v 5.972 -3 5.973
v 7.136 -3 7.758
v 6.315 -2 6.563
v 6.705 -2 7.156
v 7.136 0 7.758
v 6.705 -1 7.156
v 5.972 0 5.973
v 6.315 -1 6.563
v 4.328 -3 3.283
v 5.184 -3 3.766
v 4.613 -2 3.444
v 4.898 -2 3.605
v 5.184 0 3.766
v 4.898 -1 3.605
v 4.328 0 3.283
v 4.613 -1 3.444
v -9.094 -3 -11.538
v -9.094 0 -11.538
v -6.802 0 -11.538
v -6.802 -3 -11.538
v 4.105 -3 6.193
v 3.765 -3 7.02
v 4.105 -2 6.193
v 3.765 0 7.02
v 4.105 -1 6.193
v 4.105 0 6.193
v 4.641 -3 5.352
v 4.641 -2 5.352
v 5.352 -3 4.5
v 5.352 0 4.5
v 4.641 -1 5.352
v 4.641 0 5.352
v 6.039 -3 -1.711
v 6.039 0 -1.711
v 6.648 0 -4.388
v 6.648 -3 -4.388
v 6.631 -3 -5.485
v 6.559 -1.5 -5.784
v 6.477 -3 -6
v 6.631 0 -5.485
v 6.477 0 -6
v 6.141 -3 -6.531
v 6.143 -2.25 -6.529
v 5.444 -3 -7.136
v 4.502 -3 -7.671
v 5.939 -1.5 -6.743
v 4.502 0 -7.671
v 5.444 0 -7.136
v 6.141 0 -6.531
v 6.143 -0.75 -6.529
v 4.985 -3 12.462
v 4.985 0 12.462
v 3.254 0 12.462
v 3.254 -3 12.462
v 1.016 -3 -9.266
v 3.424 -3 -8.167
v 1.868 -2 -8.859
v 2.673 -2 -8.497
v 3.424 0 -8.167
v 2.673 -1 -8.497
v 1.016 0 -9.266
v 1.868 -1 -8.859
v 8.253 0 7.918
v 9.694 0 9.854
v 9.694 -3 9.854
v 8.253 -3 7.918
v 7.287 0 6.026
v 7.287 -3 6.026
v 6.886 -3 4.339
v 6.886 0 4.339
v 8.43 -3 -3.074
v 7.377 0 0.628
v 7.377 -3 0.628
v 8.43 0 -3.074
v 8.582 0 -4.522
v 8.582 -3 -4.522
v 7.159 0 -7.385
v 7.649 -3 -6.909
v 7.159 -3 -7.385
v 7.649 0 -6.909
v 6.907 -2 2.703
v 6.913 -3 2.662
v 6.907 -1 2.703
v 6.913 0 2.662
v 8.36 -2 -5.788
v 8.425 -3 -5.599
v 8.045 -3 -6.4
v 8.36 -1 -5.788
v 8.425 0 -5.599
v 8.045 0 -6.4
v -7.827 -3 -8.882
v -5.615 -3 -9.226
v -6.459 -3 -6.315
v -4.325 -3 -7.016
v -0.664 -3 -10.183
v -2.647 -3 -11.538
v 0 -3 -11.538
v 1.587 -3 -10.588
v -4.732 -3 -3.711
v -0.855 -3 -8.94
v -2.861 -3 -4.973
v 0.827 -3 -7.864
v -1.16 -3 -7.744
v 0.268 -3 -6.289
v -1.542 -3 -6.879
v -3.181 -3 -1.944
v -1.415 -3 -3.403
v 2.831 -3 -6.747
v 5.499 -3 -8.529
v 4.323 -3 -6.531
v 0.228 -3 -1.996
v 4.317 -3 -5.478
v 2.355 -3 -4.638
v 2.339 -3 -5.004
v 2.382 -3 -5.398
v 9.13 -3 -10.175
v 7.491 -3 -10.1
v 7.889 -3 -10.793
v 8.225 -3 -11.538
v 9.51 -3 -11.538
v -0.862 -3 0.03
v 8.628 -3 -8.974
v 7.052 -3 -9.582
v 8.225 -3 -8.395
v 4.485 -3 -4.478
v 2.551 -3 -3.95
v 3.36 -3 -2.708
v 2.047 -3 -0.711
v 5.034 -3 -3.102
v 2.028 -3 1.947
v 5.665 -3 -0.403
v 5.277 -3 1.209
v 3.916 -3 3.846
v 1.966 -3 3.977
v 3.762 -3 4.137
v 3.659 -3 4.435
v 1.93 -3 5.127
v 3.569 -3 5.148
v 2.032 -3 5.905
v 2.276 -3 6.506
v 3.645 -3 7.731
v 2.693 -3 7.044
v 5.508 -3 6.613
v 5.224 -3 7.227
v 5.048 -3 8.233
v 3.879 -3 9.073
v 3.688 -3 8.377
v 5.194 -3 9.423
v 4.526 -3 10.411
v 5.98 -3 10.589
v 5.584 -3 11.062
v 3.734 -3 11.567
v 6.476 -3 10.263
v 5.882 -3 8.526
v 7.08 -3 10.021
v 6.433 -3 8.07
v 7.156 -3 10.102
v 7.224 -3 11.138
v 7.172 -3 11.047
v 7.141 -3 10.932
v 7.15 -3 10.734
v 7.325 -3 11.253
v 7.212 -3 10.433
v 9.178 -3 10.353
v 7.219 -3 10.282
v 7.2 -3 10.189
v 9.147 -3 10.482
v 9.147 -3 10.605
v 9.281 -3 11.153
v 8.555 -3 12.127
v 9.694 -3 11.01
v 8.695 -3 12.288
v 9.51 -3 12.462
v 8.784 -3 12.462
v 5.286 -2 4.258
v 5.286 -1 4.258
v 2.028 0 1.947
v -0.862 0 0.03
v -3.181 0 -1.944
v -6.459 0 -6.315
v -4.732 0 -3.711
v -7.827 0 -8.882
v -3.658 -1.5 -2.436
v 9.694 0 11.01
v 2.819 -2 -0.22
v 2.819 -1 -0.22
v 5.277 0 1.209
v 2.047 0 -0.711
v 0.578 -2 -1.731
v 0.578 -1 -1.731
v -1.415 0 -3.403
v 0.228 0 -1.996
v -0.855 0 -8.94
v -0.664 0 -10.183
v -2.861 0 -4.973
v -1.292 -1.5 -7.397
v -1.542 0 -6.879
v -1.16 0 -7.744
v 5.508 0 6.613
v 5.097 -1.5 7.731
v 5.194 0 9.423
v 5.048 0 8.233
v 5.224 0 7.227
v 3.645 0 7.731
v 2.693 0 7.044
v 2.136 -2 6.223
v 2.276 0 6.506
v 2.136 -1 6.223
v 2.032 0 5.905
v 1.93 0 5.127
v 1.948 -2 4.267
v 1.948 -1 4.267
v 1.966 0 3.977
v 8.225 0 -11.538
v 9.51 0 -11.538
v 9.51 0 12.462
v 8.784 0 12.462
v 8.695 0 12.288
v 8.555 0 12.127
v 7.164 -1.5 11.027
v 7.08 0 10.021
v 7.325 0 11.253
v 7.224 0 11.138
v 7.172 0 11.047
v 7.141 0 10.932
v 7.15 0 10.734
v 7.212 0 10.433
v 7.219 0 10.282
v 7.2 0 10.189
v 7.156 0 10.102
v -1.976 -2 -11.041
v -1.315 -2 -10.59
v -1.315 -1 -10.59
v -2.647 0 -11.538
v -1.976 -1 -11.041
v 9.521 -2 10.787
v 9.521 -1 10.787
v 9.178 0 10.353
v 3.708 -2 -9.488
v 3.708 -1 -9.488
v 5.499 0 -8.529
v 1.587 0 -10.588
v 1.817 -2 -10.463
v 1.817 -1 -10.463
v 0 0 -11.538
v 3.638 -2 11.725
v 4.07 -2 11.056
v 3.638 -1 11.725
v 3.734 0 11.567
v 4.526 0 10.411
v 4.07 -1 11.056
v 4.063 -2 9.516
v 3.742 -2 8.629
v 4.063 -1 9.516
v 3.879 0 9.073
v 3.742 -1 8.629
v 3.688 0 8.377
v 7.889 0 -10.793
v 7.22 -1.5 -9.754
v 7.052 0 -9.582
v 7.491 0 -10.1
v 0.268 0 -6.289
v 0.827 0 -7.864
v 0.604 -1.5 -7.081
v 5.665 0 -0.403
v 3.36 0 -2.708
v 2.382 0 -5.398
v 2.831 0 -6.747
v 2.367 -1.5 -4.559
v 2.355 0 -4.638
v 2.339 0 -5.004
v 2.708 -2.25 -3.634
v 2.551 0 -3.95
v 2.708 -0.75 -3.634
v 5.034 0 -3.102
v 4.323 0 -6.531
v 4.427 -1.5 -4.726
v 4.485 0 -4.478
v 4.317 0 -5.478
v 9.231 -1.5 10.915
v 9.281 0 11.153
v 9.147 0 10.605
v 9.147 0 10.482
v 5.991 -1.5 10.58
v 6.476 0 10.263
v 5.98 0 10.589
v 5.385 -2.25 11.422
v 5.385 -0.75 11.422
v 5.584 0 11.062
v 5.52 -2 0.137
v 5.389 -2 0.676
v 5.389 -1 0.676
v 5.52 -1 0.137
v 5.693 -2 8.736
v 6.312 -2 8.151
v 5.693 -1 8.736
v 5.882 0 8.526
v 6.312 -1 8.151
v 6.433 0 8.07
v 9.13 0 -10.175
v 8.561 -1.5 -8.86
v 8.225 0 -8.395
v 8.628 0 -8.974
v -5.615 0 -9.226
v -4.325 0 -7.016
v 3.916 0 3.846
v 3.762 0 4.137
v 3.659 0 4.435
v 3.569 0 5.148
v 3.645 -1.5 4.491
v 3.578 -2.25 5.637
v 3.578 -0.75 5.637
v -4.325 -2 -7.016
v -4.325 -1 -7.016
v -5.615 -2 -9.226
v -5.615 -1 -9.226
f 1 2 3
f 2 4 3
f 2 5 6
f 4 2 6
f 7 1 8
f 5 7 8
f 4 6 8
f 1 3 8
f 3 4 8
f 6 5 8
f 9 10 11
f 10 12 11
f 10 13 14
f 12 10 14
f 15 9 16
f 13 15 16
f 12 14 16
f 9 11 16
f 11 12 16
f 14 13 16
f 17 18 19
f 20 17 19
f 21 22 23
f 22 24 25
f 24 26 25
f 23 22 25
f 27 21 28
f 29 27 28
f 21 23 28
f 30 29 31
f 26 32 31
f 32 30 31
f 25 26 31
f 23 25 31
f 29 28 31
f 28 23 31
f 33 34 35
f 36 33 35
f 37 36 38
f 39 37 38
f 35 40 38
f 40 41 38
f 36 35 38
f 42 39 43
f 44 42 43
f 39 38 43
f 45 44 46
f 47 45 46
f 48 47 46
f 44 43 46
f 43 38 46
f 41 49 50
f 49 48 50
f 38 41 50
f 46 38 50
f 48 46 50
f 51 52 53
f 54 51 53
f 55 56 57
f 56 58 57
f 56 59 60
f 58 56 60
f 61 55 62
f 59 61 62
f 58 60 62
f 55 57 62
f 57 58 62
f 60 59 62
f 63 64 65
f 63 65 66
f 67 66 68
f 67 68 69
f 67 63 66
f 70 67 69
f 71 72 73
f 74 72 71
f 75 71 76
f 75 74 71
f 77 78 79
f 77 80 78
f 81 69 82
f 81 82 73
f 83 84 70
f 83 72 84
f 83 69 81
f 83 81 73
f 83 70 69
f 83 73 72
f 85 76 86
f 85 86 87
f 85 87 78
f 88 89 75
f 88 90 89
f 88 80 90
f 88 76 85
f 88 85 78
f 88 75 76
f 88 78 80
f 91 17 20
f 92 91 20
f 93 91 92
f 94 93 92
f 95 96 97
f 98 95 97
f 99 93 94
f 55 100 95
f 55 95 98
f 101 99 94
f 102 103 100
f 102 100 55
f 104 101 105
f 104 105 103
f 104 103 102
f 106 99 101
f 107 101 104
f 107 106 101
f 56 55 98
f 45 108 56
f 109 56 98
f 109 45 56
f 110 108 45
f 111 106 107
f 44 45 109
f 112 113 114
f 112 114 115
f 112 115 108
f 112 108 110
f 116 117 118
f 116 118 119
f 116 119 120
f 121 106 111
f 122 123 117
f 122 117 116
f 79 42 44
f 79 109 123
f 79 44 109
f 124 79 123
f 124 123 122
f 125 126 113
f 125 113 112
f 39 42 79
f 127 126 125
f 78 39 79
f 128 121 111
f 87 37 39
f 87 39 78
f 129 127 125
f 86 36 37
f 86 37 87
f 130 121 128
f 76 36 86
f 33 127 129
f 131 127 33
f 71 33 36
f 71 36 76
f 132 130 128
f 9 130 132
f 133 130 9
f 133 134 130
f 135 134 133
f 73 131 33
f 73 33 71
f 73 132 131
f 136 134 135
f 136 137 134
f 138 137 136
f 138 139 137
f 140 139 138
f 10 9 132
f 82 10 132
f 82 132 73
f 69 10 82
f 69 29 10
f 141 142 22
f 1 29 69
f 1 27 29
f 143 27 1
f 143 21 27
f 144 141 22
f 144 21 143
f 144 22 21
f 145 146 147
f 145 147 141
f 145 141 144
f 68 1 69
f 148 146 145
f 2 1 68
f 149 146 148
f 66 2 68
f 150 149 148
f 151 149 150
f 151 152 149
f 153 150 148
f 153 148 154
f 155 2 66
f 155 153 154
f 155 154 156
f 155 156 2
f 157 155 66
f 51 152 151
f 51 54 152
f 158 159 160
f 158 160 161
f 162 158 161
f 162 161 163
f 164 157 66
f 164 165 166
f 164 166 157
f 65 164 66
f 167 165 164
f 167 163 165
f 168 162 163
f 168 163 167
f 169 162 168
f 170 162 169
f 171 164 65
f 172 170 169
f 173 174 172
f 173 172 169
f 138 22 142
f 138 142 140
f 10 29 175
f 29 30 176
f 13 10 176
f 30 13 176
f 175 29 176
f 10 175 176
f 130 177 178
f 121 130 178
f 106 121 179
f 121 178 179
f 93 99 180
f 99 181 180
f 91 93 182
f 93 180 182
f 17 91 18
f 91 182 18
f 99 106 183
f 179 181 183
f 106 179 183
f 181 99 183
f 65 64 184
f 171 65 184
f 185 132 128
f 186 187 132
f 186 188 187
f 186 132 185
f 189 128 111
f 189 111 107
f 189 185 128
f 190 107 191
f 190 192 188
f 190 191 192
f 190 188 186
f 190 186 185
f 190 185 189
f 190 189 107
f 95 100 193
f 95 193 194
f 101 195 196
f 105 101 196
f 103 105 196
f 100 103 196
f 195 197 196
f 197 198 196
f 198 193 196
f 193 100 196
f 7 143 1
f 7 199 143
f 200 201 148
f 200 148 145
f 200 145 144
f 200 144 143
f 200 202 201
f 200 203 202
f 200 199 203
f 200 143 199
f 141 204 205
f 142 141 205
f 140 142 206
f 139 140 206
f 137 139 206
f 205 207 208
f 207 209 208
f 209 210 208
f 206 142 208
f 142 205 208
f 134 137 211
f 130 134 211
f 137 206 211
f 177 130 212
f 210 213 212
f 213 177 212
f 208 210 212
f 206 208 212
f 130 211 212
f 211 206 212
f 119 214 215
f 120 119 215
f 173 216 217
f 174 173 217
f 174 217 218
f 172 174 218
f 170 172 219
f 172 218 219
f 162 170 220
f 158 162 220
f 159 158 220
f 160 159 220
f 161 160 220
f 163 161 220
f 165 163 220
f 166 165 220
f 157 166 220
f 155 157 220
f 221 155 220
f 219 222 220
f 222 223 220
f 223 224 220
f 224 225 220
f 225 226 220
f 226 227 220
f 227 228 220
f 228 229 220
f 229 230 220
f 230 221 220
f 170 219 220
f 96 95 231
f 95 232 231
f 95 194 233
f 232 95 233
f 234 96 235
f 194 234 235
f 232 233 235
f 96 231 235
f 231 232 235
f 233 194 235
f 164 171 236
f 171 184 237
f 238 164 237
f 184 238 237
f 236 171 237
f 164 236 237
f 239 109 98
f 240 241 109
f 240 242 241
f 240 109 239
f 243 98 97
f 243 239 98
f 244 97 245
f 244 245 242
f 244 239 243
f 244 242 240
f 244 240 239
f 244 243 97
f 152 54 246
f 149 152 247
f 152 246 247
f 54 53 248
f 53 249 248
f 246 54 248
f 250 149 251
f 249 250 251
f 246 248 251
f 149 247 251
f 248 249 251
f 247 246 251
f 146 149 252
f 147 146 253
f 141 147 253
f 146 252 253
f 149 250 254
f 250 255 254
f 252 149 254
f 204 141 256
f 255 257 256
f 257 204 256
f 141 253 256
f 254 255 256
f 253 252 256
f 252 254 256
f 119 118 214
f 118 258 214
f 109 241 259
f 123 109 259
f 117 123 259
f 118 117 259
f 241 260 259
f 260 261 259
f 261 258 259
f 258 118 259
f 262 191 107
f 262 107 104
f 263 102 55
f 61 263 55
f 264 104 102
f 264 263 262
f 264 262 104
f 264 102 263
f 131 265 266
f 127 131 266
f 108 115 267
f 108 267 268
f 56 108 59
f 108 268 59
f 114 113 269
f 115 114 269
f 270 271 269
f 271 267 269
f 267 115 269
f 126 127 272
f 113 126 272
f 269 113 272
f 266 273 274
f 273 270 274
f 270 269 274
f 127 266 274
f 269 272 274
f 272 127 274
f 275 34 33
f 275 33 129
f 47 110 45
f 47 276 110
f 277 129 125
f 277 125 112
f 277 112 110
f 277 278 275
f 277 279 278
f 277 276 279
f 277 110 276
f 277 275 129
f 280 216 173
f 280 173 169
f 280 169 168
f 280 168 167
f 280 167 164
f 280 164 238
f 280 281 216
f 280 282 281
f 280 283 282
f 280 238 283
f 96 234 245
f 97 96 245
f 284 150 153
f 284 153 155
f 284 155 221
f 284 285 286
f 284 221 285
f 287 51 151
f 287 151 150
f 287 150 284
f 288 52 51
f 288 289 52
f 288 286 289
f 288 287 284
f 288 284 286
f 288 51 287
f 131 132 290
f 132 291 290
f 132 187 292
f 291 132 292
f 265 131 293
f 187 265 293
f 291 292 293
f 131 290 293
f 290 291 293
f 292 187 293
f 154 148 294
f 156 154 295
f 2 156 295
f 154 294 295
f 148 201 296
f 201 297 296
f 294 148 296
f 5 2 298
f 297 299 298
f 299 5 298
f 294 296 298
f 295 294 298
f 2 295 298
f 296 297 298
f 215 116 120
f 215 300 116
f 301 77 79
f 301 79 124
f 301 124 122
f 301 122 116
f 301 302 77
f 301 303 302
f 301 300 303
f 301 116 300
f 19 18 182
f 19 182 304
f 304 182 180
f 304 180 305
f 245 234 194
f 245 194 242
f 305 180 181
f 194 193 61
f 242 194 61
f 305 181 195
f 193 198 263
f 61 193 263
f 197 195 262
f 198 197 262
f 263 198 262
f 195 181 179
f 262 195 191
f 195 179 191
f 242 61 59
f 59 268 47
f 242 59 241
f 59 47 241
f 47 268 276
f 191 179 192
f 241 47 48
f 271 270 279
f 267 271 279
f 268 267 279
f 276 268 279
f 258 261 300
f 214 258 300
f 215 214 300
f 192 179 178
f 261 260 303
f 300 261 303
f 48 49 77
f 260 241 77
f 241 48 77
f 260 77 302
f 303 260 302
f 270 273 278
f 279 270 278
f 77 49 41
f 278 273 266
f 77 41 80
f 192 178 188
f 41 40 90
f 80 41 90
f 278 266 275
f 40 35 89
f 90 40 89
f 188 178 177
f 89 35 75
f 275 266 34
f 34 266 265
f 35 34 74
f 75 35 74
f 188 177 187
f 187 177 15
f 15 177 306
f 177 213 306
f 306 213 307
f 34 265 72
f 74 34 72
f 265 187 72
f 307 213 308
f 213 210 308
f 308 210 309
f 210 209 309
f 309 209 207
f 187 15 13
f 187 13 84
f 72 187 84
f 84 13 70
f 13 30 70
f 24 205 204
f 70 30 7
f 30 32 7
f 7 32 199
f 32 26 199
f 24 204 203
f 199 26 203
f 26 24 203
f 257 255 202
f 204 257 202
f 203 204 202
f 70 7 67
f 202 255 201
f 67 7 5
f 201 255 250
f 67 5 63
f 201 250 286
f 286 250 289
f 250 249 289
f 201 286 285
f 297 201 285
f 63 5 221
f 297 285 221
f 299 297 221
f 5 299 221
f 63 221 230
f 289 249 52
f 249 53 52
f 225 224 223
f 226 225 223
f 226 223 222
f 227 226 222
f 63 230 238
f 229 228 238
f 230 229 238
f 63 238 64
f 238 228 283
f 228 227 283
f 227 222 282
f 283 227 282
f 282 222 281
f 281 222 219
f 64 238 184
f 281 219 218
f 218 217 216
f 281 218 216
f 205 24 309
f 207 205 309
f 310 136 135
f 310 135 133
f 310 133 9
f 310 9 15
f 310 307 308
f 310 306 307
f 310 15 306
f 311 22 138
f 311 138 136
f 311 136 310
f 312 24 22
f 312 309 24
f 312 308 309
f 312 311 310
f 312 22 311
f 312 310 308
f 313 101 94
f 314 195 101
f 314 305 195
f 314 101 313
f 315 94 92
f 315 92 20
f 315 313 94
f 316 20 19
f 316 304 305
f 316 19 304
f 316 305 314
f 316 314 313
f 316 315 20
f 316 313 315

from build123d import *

# Parameters (mm, degrees)
F1_DEPTH = 50
F2_SCALE = 0.06


with BuildPart() as f1:
    # F0 (on Front) → F1 (new body)
    with BuildSketch(Plane.XZ):
        with BuildLine():
            add(Edge.make_bspline(
                [(33.7992499113, 32.4442463824), (-1.3140516, 11.1969938069), (-82.9509326157, -45.9527424638), (-125.9686970754, -137.606794731), (-151.571293213, -192.3071747745)],
                knots=[0.1650584684, 0.1650584684, 0.1650584684, 0.1650584684, 0.502312505, 1, 1, 1, 1], degree=3))
            Line((-151.571293213, -192.3071747745), (-113.3603453636, -192.3071747745))
            add(Edge.make_bspline(
                [(-47.6813485904, -82.8825103726), (-73.9418191046, -115.1830009143), (-94.0292507398, -153.2818472534), (-113.3603453636, -192.3071747745)],
                knots=[0.5680635842, 0.5680635842, 0.5680635842, 0.5680635842, 1, 1, 1, 1], degree=3))
            add(Edge.make_bspline(
                [(-23.5778673601, -56.7194873224), (-27.8845088808, -60.8451196614), (-36.1979815182, -69.3017688301), (-43.9455530092, -78.2874659017), (-47.6813485904, -82.8825103726)],
                knots=[0.44475387, 0.44475387, 0.44475387, 0.44475387, 0.5066166215, 0.5680635842, 0.5680635842, 0.5680635842, 0.5680635842], degree=3))
            add(Edge.make_bspline(
                [(87.9483139372, 20.1501727821), (45.3698576212, -3.4429156349), (7.3841483298, -27.0588126184), (-23.5778673601, -56.7194873224)],
                knots=[0, 0, 0, 0, 0.44475387, 0.44475387, 0.44475387, 0.44475387], degree=3))
            add(Edge.make_bspline(
                [(86.4029882629, 62.7652361886), (85.449929096, 56.9509946506), (84.4401796439, 43.3835035509), (86.3354202415, 28.6006214532), (87.9483139372, 20.1501727821)],
                knots=[0.2898066076, 0.2898066076, 0.2898066076, 0.2898066076, 0.3311800495, 0.3836336632, 0.3836336632, 0.3836336632, 0.3836336632], degree=3))
            add(Edge.make_bspline(
                [(86.4029882629, 62.7652361886), (81.640548889, 60.0876764663), (76.8798520499, 57.4104488306), (72.1303694176, 54.7249239917)],
                knots=[0, 0, 0, 0, 0.0443577779, 0.0443577779, 0.0443577779, 0.0443577779], degree=3))
            add(Edge.make_bspline(
                [(72.1303694176, 54.7249239917), (59.2066870205, 47.4174185697), (46.3660371976, 40.0484787401), (33.7992499113, 32.4442463824)],
                knots=[0.0443577779, 0.0443577779, 0.0443577779, 0.0443577779, 0.1650584684, 0.1650584684, 0.1650584684, 0.1650584684], degree=3))
        make_face()
        with BuildLine():
            add(Edge.make_bspline(
                [(-47.6813485904, -82.8825103726), (-37.6976178586, -95.8078145278), (-17.6570022581, -121.6548352785), (-13.2867608742, -153.7004230944), (-11.0641516952, -169.7119861588)],
                knots=[0, 0, 0, 0, 0.5013709336, 1, 1, 1, 1], degree=3))
            add(Edge.make_bspline(
                [(16.9321630542, -154.4396487608), (7.9475731058, -158.9016267331), (-1.4242642684, -163.9163277691), (-11.0641516952, -169.7119861588)],
                knots=[0.8987923644, 0.8987923644, 0.8987923644, 0.8987923644, 0.9466643403, 0.9466643403, 0.9466643403, 0.9466643403], degree=3))
            add(Edge.make_bspline(
                [(-23.5778673601, -56.7194873224), (-10.048506017, -78.2254081232), (13.3855203997, -115.4324178206), (15.8758483062, -142.8745703905), (16.9321630542, -154.4396487608)],
                knots=[0, 0, 0, 0, 0.5786754475, 1, 1, 1, 1], degree=3))
            add(Edge.make_bspline(
                [(-23.5778673601, -56.7194873224), (-27.8845088808, -60.8451196614), (-36.1979815182, -69.3017688301), (-43.9455530092, -78.2874659017), (-47.6813485904, -82.8825103726)],
                knots=[0.44475387, 0.44475387, 0.44475387, 0.44475387, 0.5066166215, 0.5680635842, 0.5680635842, 0.5680635842, 0.5680635842], degree=3))
        make_face()
        with BuildLine():
            Line((161.5726722864, 164.2289310694), (161.5726722864, 183.500433121))
            add(Edge.make_bspline(
                [(161.5726722864, 183.500433121), (158.6697561937, 179.7603709259), (155.7997051715, 176.1136274949), (152.9720624863, 172.5488397796)],
                knots=[0, 0, 0, 0, 0.0227975426, 0.0227975426, 0.0227975426, 0.0227975426], degree=3))
            add(Edge.make_bspline(
                [(152.9720624863, 172.5488397796), (149.5266021616, 168.2051740458), (146.144106472, 163.9831898515), (142.8418403639, 159.8623300408)],
                knots=[0.0227975426, 0.0227975426, 0.0227975426, 0.0227975426, 0.0505761686, 0.0505761686, 0.0505761686, 0.0505761686], degree=3))
            add(Edge.make_bspline(
                [(142.8418403639, 159.8623300408), (134.2230298354, 149.1070157325), (126.1507380473, 139.0405542113), (118.931917396, 129.2974610904)],
                knots=[0.0505761686, 0.0505761686, 0.0505761686, 0.0505761686, 0.1230775075, 0.1230775075, 0.1230775075, 0.1230775075], degree=3))
            add(Edge.make_bspline(
                [(118.931917396, 129.2974610904), (111.4275135493, 119.1689222297), (104.8454447873, 109.3898433661), (99.5305536728, 99.5496247644)],
                knots=[0.1230775075, 0.1230775075, 0.1230775075, 0.1230775075, 0.1984470661, 0.1984470661, 0.1984470661, 0.1984470661], degree=3))
            add(Edge.make_bspline(
                [(99.5305536728, 99.5496247644), (95.1743477908, 91.4843573429), (91.6694084315, 83.3780173754), (89.2056084764, 75.0045255924)],
                knots=[0.1984470661, 0.1984470661, 0.1984470661, 0.1984470661, 0.260221674, 0.260221674, 0.260221674, 0.260221674], degree=3))
            add(Edge.make_bspline(
                [(89.2056084764, 75.0045255924), (88.0256518483, 70.9943148164), (87.0844928908, 66.9228296031), (86.4029882629, 62.7652361886)],
                knots=[0.260221674, 0.260221674, 0.260221674, 0.260221674, 0.2898066076, 0.2898066076, 0.2898066076, 0.2898066076], degree=3))
            add(Edge.make_bspline(
                [(86.4029882629, 62.7652361886), (85.449929096, 56.9509946506), (84.4401796439, 43.3835035509), (86.3354202415, 28.6006214532), (87.9483139372, 20.1501727821)],
                knots=[0.2898066076, 0.2898066076, 0.2898066076, 0.2898066076, 0.3311800495, 0.3836336632, 0.3836336632, 0.3836336632, 0.3836336632], degree=3))
            add(Edge.make_bspline(
                [(87.9483139372, 20.1501727821), (89.6334036756, 11.3214667244), (91.9225091752, 2.2895818916), (94.4113235468, -6.7245809888)],
                knots=[0.3836336632, 0.3836336632, 0.3836336632, 0.3836336632, 0.4384351956, 0.4384351956, 0.4384351956, 0.4384351956], degree=3))
            add(Edge.make_bspline(
                [(94.4113235468, -6.7245809888), (96.4305537515, -14.0379709171), (98.5812410463, -21.3396954834), (100.6474662993, -28.5117831797)],
                knots=[0.4384351956, 0.4384351956, 0.4384351956, 0.4384351956, 0.4828968922, 0.4828968922, 0.4828968922, 0.4828968922], degree=3))
            add(Edge.make_bspline(
                [(100.6474662993, -28.5117831797), (108.2301787006, -54.8321847135), (119.9469648226, -99.5063533785), (92.6369226658, -119.1415299059), (75.0321073118, -127.8520125935)],
                knots=[0.4828968922, 0.4828968922, 0.4828968922, 0.4828968922, 0.6460641257, 0.7795199626, 0.7795199626, 0.7795199626, 0.7795199626], degree=3))
            add(Edge.make_bspline(
                [(75.0321073118, -127.8520125935), (69.5360042843, -130.5713657539), (63.5216279141, -133.2786604033), (57.0675570237, -136.1243560803)],
                knots=[0.7795199626, 0.7795199626, 0.7795199626, 0.7795199626, 0.8211839627, 0.8211839627, 0.8211839627, 0.8211839627], degree=3))
            add(Edge.make_bspline(
                [(57.0675570237, -136.1243560803), (45.045424625, -141.4250927436), (31.4976714177, -147.2060434603), (16.9321630542, -154.4396487608)],
                knots=[0.8211839627, 0.8211839627, 0.8211839627, 0.8211839627, 0.8987923644, 0.8987923644, 0.8987923644, 0.8987923644], degree=3))
            add(Edge.make_bspline(
                [(16.9321630542, -154.4396487608), (7.9475731058, -158.9016267331), (-1.4242642684, -163.9163277691), (-11.0641516952, -169.7119861588)],
                knots=[0.8987923644, 0.8987923644, 0.8987923644, 0.8987923644, 0.9466643403, 0.9466643403, 0.9466643403, 0.9466643403], degree=3))
            add(Edge.make_bspline(
                [(-11.0641516952, -169.7119861588), (-21.8042505923, -176.1691097249), (-32.877076864, -183.5956264599), (-44.1177855636, -192.3071747745)],
                knots=[0.9466643403, 0.9466643403, 0.9466643403, 0.9466643403, 1, 1, 1, 1], degree=3))
            Line((-44.1177855636, -192.3071747745), (0, -192.3071747745))
            add(Edge.make_bspline(
                [(91.6558492517, -142.1554952409), (63.5808744263, -158.4654974972), (28.6929657416, -173.0898848198), (0, -192.3071747745)],
                knots=[0.8011074852, 0.8011074852, 0.8011074852, 0.8011074852, 1, 1, 1, 1], degree=3))
            add(Edge.make_bspline(
                [(119.3154431729, -123.0815035944), (111.4612420038, -129.8801116218), (102.0230483979, -136.1327279003), (91.6558492517, -142.1554952409)],
                knots=[0.7276627779, 0.7276627779, 0.7276627779, 0.7276627779, 0.8011074852, 0.8011074852, 0.8011074852, 0.8011074852], degree=3))
            add(Edge.make_bspline(
                [(161.5726722864, 164.2289310694), (127.9283165879, 123.741138071), (90.0243038422, 52.1079771624), (162.5005260377, -72.9909762919), (128.5067292283, -115.1255129324), (119.3154431729, -123.0815035944)],
                knots=[0, 0, 0, 0, 0.3115903654, 0.6417149775, 0.7276627779, 0.7276627779, 0.7276627779, 0.7276627779], degree=3))
        make_face()
        with BuildLine():
            add(Edge.make_bspline(
                [(119.3154431729, -123.0815035944), (127.8271004026, -130.229203514), (146.5347439848, -145.9824570753), (154.2952784291, -176.0164611644), (158.504858613, -192.3071747745)],
                knots=[0, 0, 0, 0, 0.4583695956, 1, 1, 1, 1], degree=3))
            add(Edge.make_bspline(
                [(119.3154431729, -123.0815035944), (111.4612420038, -129.8801116218), (102.0230483979, -136.1327279003), (91.6558492517, -142.1554952409)],
                knots=[0.7276627779, 0.7276627779, 0.7276627779, 0.7276627779, 0.8011074852, 0.8011074852, 0.8011074852, 0.8011074852], degree=3))
            add(Edge.make_bspline(
                [(91.6558492517, -142.1554952409), (102.2562480915, -148.266180717), (123.0818131064, -159.961158959), (132.4458816607, -181.5720975488), (137.090831995, -192.3071747745)],
                knots=[0, 0, 0, 0, 0.5038335041, 1, 1, 1, 1], degree=3))
            Line((137.090831995, -192.3071747745), (158.504858613, -192.3071747745))
        make_face()
        with BuildLine():
            add(Edge.make_bspline(
                [(94.4113235468, -6.7245809888), (96.4305537515, -14.0379709171), (98.5812410463, -21.3396954834), (100.6474662993, -28.5117831797)],
                knots=[0.4384351956, 0.4384351956, 0.4384351956, 0.4384351956, 0.4828968922, 0.4828968922, 0.4828968922, 0.4828968922], degree=3))
            add(Edge.make_bspline(
                [(94.4113235468, -6.7245809888), (69.8929498645, -30.0484086542), (20.7095259404, -72.3808334135), (49.418452744, -114.6003239541), (57.0675570237, -136.1243560803)],
                knots=[0, 0, 0, 0, 0.5429128164, 1, 1, 1, 1], degree=3))
            add(Edge.make_bspline(
                [(75.0321073118, -127.8520125935), (69.5360042843, -130.5713657539), (63.5216279141, -133.2786604033), (57.0675570237, -136.1243560803)],
                knots=[0.7795199626, 0.7795199626, 0.7795199626, 0.7795199626, 0.8211839627, 0.8211839627, 0.8211839627, 0.8211839627], degree=3))
            add(Edge.make_bspline(
                [(100.6474662993, -28.5117831797), (85.276066462, -45.5253793732), (69.9269817684, -77.6031695274), (71.0284103415, -109.5876994667), (75.0321073118, -127.8520125935)],
                knots=[0, 0, 0, 0, 0.5186390985, 1, 1, 1, 1], degree=3))
        make_face()
        with BuildLine():
            add(Edge.make_bspline(
                [(60.7451200485, 128.8491934538), (60.921887229, 124.9463354687), (61.6026617993, 120.996224136), (62.7479620056, 117.0065256713)],
                knots=[0.4677213645, 0.4677213645, 0.4677213645, 0.4677213645, 0.588178468, 0.588178468, 0.588178468, 0.588178468], degree=3))
            add(Edge.make_bspline(
                [(60.7451200485, 128.8491934538), (48.2160558796, 122.1916522311), (31.5425676347, 105.5782576293), (31.9310774144, 71.145822202), (34.5967065269, 43.9006996814), (33.7992499113, 32.4442463824)],
                knots=[0, 0, 0, 0, 0.333000285, 0.6525505547, 1, 1, 1, 1], degree=3))
            add(Edge.make_bspline(
                [(72.1303694176, 54.7249239917), (59.2066870205, 47.4174185697), (46.3660371976, 40.0484787401), (33.7992499113, 32.4442463824)],
                knots=[0.0443577779, 0.0443577779, 0.0443577779, 0.0443577779, 0.1650584684, 0.1650584684, 0.1650584684, 0.1650584684], degree=3))
            add(Edge.make_bspline(
                [(62.7479620056, 117.0065256713), (59.6024443223, 101.0625210628), (57.2426052815, 73.9770761074), (66.5558771435, 61.7781009903), (72.1303694176, 54.7249239917)],
                knots=[0, 0, 0, 0, 0.5746630446, 1, 1, 1, 1], degree=3))
        make_face()
        with BuildLine():
            add(Edge.make_bspline(
                [(75.4271748481, 173.5246273106), (77.3752720663, 170.7812263834), (81.134719612, 165.4233111741), (84.7614654199, 159.7675420119), (86.5594399231, 157.0506042409)],
                knots=[0.3943758085, 0.3943758085, 0.3943758085, 0.3943758085, 0.4949279004, 0.5888141141, 0.5888141141, 0.5888141141, 0.5888141141], degree=3))
            add(Edge.make_bspline(
                [(75.4271748481, 173.5246273106), (66.9712117374, 158.4454793727), (60.0587529981, 144.0035513846), (60.7451200485, 128.8491934538)],
                knots=[0, 0, 0, 0, 0.4677213645, 0.4677213645, 0.4677213645, 0.4677213645], degree=3))
            add(Edge.make_bspline(
                [(60.7451200485, 128.8491934538), (60.921887229, 124.9463354687), (61.6026617993, 120.996224136), (62.7479620056, 117.0065256713)],
                knots=[0.4677213645, 0.4677213645, 0.4677213645, 0.4677213645, 0.588178468, 0.588178468, 0.588178468, 0.588178468], degree=3))
            add(Edge.make_bspline(
                [(62.7479620056, 117.0065256713), (66.6635408444, 103.3664522692), (76.0086586492, 89.2636705474), (89.2056084764, 75.0045255924)],
                knots=[0.588178468, 0.588178468, 0.588178468, 0.588178468, 1, 1, 1, 1], degree=3))
            add(Edge.make_bspline(
                [(99.5305536728, 99.5496247644), (95.1743477908, 91.4843573429), (91.6694084315, 83.3780173754), (89.2056084764, 75.0045255924)],
                knots=[0.1984470661, 0.1984470661, 0.1984470661, 0.1984470661, 0.260221674, 0.260221674, 0.260221674, 0.260221674], degree=3))
            add(Edge.make_bspline(
                [(86.5594399231, 157.0506042409), (83.9878015469, 147.0462299724), (82.836579489, 127.8427234548), (90.6243055451, 109.9335235527), (99.5305536728, 99.5496247644)],
                knots=[0, 0, 0, 0, 0.4816112661, 1, 1, 1, 1], degree=3))
        make_face()
        with BuildLine():
            add(Edge.make_bspline(
                [(83.0902010202, 207.6928252255), (87.110088997, 195.8396449748), (93.5872758475, 177.0872799999), (110.8460810758, 169.3792962525), (118.0063178545, 167.0171113404)],
                knots=[0, 0, 0, 0, 0.4677504063, 0.7294986849, 0.7294986849, 0.7294986849, 0.7294986849], degree=3))
            Line((83.0902010202, 207.6928252255), (54.227810353, 207.6928252255))
            add(Edge.make_bspline(
                [(54.227810353, 207.6928252255), (60.0854175021, 194.6229659864), (67.7865340514, 184.2845323351), (75.4271748481, 173.5246273106)],
                knots=[0, 0, 0, 0, 0.3943758085, 0.3943758085, 0.3943758085, 0.3943758085], degree=3))
            add(Edge.make_bspline(
                [(75.4271748481, 173.5246273106), (77.3752720663, 170.7812263834), (81.134719612, 165.4233111741), (84.7614654199, 159.7675420119), (86.5594399231, 157.0506042409)],
                knots=[0.3943758085, 0.3943758085, 0.3943758085, 0.3943758085, 0.4949279004, 0.5888141141, 0.5888141141, 0.5888141141, 0.5888141141], degree=3))
            add(Edge.make_bspline(
                [(86.5594399231, 157.0506042409), (94.3573639982, 145.2670809389), (103.0350172008, 133.7468834117), (118.931917396, 129.2974610904)],
                knots=[0.5888141141, 0.5888141141, 0.5888141141, 0.5888141141, 0.9960042969, 0.9960042969, 0.9960042969, 0.9960042969], degree=3))
            add(Edge.make_bspline(
                [(142.8418403639, 159.8623300408), (134.2230298354, 149.1070157325), (126.1507380473, 139.0405542113), (118.931917396, 129.2974610904)],
                knots=[0.0505761686, 0.0505761686, 0.0505761686, 0.0505761686, 0.1230775075, 0.1230775075, 0.1230775075, 0.1230775075], degree=3))
            add(Edge.make_bspline(
                [(118.0063178545, 167.0171113404), (125.4059977095, 164.5759333951), (133.8391586431, 162.5656756814), (142.8418403639, 159.8623300408)],
                knots=[0.7294986849, 0.7294986849, 0.7294986849, 0.7294986849, 1, 1, 1, 1], degree=3))
        make_face()
        with BuildLine():
            add(Edge.make_bspline(
                [(158.504858613, 207.6928252255), (155.8710665844, 197.6334981347), (155.1200926152, 181.8258093222), (151.6002153146, 176.3836793356), (152.9720624863, 172.5488397796)],
                knots=[0, 0, 0, 0, 0.625221571, 1, 1, 1, 1], degree=3))
            Line((158.504858613, 207.6928252255), (146.4012861252, 207.6928252255))
            add(Edge.make_bspline(
                [(146.4012861252, 207.6928252255), (143.1155545876, 197.7078282598), (108.3076436448, 187.9302668709), (123.4952842004, 171.6174236455), (118.0063178545, 167.0171113404)],
                knots=[0, 0, 0, 0, 0.5941954131, 1, 1, 1, 1], degree=3))
            add(Edge.make_bspline(
                [(118.0063178545, 167.0171113404), (125.4059977095, 164.5759333951), (133.8391586431, 162.5656756814), (142.8418403639, 159.8623300408)],
                knots=[0.7294986849, 0.7294986849, 0.7294986849, 0.7294986849, 1, 1, 1, 1], degree=3))
            add(Edge.make_bspline(
                [(152.9720624863, 172.5488397796), (149.5266021616, 168.2051740458), (146.144106472, 163.9831898515), (142.8418403639, 159.8623300408)],
                knots=[0.0227975426, 0.0227975426, 0.0227975426, 0.0227975426, 0.0505761686, 0.0505761686, 0.0505761686, 0.0505761686], degree=3))
        make_face()
    extrude(amount=F1_DEPTH)


with BuildPart() as f1_1:
    # F2: moved
    add(f1.part.scale(F2_SCALE))


solid = f1_1.part
